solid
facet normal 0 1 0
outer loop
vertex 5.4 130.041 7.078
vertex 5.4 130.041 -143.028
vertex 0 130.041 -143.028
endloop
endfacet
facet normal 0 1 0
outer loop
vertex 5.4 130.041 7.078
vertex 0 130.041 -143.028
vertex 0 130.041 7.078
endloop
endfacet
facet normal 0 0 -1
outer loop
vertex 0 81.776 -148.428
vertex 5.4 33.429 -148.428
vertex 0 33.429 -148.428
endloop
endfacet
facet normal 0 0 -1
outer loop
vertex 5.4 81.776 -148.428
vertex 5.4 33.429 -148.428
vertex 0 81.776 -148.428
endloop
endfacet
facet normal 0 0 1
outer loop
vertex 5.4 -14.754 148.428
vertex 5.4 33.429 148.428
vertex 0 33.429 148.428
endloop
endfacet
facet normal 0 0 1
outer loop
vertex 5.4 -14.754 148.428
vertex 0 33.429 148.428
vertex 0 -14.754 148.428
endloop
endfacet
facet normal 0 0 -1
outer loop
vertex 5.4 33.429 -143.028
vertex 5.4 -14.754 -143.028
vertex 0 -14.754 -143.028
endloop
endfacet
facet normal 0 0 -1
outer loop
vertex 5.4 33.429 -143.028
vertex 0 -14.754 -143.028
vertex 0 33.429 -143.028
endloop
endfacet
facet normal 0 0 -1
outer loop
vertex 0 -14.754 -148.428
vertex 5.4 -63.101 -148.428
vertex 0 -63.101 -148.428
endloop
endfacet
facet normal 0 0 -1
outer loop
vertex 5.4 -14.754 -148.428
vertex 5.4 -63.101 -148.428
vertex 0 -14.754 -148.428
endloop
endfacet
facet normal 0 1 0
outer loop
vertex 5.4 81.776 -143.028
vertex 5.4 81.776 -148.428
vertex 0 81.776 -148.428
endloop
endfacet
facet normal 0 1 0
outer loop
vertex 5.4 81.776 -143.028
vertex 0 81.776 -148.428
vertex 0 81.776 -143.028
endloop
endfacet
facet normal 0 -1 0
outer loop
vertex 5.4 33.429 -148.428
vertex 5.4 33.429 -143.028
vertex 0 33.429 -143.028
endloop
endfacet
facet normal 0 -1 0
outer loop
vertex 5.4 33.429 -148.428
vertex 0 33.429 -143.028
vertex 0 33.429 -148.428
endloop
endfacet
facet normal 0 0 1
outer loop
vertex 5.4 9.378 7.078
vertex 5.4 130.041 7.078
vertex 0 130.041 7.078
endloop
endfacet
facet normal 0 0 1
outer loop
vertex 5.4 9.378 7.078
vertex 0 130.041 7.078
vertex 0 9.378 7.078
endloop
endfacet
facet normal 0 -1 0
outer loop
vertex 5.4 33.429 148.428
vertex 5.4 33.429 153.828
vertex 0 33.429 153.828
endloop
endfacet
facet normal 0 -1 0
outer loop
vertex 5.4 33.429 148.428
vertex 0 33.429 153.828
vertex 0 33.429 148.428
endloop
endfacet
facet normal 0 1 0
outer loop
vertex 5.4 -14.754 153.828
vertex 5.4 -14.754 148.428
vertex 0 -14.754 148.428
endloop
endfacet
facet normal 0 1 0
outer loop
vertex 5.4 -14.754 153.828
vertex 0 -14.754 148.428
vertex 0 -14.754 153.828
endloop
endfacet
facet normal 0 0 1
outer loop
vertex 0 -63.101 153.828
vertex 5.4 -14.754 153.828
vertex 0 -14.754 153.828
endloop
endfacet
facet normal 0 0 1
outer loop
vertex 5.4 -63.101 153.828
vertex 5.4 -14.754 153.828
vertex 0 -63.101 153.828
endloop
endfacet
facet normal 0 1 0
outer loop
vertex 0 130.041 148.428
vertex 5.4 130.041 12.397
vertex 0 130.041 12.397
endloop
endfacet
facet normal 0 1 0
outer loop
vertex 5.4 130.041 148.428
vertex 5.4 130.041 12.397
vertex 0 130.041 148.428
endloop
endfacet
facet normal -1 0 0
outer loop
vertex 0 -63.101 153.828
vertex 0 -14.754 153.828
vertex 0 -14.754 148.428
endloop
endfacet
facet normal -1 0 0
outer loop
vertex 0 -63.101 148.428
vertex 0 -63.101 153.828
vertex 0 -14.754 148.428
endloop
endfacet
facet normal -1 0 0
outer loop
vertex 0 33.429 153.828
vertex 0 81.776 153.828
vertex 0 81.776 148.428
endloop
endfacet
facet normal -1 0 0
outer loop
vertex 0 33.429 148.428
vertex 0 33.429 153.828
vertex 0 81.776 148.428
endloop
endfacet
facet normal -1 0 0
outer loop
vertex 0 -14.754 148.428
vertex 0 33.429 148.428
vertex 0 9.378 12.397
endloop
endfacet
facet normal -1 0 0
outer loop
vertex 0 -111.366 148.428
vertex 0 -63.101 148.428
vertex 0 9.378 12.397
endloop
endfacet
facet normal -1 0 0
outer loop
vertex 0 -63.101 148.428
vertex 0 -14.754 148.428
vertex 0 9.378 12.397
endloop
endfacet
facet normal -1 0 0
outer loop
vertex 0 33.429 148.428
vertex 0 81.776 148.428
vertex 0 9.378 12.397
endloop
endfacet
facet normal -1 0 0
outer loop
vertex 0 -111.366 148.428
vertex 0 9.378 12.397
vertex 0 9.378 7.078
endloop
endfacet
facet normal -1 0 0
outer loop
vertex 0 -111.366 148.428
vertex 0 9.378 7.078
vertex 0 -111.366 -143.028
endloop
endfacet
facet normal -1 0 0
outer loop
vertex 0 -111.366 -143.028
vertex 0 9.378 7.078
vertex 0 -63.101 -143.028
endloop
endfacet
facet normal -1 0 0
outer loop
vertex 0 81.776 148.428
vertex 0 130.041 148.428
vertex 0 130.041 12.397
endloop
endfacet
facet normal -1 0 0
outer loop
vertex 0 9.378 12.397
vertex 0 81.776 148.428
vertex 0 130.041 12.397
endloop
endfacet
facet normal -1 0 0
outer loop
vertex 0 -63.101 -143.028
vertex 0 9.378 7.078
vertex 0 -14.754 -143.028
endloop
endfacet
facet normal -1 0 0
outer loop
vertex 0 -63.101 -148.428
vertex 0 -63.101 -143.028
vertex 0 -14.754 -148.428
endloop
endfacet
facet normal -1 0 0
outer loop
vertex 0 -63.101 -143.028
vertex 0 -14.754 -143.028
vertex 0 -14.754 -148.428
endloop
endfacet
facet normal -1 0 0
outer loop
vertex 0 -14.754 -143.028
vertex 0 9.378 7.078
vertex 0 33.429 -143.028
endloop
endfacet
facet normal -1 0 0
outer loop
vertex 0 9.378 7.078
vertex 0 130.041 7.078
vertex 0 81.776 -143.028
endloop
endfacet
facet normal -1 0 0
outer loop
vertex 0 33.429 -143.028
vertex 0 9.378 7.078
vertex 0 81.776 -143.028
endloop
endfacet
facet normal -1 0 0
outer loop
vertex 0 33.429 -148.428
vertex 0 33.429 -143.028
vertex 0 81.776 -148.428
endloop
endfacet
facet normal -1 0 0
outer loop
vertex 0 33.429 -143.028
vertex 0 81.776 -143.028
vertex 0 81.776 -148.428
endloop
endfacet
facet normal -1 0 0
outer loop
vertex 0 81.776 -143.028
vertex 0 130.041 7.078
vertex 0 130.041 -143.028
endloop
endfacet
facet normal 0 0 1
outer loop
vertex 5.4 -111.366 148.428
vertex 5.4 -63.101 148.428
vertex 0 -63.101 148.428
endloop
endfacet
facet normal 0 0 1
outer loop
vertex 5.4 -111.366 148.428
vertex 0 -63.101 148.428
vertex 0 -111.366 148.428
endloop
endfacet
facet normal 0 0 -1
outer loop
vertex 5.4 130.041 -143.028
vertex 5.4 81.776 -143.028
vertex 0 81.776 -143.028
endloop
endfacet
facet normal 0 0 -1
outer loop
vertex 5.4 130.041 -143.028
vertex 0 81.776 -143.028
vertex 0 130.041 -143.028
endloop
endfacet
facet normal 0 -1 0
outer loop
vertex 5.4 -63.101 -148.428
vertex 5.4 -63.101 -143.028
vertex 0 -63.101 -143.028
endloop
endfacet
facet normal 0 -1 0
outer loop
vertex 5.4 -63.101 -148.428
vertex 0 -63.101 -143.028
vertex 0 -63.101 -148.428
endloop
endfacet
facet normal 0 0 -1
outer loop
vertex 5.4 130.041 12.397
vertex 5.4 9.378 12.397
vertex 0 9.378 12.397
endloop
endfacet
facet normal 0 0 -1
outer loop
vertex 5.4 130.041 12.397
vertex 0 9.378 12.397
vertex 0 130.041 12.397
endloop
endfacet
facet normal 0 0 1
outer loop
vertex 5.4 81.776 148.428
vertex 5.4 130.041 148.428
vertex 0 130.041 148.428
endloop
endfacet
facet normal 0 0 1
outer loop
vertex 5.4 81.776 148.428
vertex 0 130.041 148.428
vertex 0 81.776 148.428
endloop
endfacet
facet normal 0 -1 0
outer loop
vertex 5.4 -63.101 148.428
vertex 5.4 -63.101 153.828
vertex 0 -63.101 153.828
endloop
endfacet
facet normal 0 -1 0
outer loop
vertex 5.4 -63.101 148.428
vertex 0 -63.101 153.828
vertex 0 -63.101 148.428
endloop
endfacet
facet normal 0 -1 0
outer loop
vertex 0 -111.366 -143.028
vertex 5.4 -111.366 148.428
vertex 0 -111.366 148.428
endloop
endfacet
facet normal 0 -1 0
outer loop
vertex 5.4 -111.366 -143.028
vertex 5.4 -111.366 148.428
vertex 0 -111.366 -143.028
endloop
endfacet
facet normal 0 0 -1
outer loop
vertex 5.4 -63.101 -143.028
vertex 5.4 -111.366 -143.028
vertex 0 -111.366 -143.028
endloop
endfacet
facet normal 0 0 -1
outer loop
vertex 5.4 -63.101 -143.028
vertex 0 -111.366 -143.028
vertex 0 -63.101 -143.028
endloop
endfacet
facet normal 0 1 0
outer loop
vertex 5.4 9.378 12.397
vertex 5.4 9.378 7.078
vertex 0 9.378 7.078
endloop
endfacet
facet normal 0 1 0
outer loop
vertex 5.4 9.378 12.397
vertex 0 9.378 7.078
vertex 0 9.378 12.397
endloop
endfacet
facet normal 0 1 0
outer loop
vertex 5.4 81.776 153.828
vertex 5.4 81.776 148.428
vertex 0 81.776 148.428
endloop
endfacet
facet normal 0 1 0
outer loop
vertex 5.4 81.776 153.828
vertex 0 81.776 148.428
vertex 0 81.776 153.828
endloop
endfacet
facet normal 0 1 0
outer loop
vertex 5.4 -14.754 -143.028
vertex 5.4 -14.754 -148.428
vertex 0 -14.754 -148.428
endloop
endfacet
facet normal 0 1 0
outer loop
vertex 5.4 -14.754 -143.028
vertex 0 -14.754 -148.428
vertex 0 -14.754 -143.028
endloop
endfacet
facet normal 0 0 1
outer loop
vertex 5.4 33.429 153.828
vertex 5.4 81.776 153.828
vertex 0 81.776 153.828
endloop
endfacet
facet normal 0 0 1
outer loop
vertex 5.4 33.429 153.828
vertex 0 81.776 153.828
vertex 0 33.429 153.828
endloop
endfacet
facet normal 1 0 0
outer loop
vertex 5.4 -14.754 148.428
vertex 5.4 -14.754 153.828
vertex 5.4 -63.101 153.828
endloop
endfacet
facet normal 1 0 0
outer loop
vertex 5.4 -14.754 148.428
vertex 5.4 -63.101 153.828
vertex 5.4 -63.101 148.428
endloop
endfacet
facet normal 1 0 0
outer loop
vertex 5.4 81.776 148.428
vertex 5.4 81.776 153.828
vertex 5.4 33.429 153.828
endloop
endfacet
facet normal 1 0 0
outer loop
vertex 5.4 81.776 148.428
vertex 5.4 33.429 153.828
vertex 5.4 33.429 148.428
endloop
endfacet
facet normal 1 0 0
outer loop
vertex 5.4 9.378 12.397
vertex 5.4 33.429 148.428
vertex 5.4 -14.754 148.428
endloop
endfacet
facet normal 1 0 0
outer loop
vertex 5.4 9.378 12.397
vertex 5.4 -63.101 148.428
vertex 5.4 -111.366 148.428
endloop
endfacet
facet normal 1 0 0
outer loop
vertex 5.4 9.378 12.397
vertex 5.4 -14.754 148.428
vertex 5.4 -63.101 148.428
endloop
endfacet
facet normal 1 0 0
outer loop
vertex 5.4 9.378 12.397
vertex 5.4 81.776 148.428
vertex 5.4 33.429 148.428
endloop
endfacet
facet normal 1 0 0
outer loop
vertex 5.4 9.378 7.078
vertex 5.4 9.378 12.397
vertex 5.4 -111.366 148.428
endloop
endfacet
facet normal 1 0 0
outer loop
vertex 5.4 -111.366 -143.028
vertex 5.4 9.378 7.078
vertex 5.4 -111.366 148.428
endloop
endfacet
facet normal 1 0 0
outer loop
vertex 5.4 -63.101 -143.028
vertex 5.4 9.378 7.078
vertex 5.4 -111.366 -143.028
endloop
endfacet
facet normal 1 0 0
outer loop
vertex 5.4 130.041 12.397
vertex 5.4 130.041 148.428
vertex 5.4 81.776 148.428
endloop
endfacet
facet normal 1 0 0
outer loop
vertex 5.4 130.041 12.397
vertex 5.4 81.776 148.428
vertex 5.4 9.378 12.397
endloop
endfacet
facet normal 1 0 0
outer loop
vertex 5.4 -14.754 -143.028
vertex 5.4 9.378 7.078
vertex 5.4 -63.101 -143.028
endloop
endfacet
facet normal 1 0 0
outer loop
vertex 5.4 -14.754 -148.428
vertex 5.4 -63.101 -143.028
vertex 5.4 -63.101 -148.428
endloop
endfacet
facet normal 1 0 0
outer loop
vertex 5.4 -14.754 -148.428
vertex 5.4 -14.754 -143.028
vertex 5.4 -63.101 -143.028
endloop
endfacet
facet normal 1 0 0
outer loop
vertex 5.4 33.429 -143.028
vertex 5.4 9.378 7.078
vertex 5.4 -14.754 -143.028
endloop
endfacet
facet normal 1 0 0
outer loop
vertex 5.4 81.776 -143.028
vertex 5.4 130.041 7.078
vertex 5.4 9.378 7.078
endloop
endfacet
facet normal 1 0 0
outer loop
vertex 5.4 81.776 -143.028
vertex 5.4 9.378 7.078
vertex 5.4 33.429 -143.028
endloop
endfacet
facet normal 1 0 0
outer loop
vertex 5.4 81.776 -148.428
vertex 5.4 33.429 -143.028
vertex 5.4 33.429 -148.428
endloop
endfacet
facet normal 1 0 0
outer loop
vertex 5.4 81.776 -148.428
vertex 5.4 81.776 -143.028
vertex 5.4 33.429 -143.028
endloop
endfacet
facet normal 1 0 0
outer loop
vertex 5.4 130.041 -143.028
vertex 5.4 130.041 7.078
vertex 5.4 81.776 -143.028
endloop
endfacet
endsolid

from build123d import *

# Parameters (mm, degrees)
BOSS_EXTRUDE2_DEPTH = 5.4
BOSS_EXTRUDE3_DEPTH = 5.4


with BuildPart() as part:
    # Sketch1 → Boss-Extrude2 (new body)
    with BuildSketch(Plane(origin=(0, 0, 0), x_dir=(0, 0, -1), z_dir=(1, 0, 0))):
        Polygon((142.9875, 130), (-7.0375, 130), (-7.0375, 9.3375), (-12.4375, 9.3375), (-12.4375, 130), (-148.3875, 130), (-148.3875, 81.735), (-153.7875, 81.735), (-153.7875, 33.47), (-148.3875, 33.47), (-148.3875, -14.795), (-153.7875, -14.795), (-153.7875, -63.06), (-148.3875, -63.06), (-148.3875, -111.325), (142.9875, -111.325), (142.9875, -63.06), (148.3875, -63.06), (148.3875, -14.795), (142.9875, -14.795), (142.9875, 33.47), (148.3875, 33.47), (148.3875, 81.735), (142.9875, 81.735), align=None)
    extrude(amount=BOSS_EXTRUDE2_DEPTH)

    # Sketch2 → Boss-Extrude3 (add)
    with BuildSketch(Plane(origin=(5.4, 0, 0), x_dir=(0, 0, -1), z_dir=(1, 0, 0))):
        Polygon((-148.42814, -111.36564), (143.02814, -111.36564), (143.02814, -63.10064), (148.42814, -63.10064), (148.42814, -14.75436), (143.02814, -14.75436), (143.02814, 33.42936), (148.42814, 33.42936), (148.42814, 81.77564), (143.02814, 81.77564), (143.02814, 130.04064), (-7.07814, 130.04064), (-7.07814, 9.37814), (-12.39686, 9.37814), (-12.39686, 130.04064), (-148.42814, 130.04064), (-148.42814, 81.77564), (-153.82814, 81.77564), (-153.82814, 33.42936), (-148.42814, 33.42936), (-148.42814, -14.75436), (-153.82814, -14.75436), (-153.82814, -63.10064), (-148.42814, -63.10064), align=None)
    extrude(amount=-BOSS_EXTRUDE3_DEPTH)


solid = part.part
